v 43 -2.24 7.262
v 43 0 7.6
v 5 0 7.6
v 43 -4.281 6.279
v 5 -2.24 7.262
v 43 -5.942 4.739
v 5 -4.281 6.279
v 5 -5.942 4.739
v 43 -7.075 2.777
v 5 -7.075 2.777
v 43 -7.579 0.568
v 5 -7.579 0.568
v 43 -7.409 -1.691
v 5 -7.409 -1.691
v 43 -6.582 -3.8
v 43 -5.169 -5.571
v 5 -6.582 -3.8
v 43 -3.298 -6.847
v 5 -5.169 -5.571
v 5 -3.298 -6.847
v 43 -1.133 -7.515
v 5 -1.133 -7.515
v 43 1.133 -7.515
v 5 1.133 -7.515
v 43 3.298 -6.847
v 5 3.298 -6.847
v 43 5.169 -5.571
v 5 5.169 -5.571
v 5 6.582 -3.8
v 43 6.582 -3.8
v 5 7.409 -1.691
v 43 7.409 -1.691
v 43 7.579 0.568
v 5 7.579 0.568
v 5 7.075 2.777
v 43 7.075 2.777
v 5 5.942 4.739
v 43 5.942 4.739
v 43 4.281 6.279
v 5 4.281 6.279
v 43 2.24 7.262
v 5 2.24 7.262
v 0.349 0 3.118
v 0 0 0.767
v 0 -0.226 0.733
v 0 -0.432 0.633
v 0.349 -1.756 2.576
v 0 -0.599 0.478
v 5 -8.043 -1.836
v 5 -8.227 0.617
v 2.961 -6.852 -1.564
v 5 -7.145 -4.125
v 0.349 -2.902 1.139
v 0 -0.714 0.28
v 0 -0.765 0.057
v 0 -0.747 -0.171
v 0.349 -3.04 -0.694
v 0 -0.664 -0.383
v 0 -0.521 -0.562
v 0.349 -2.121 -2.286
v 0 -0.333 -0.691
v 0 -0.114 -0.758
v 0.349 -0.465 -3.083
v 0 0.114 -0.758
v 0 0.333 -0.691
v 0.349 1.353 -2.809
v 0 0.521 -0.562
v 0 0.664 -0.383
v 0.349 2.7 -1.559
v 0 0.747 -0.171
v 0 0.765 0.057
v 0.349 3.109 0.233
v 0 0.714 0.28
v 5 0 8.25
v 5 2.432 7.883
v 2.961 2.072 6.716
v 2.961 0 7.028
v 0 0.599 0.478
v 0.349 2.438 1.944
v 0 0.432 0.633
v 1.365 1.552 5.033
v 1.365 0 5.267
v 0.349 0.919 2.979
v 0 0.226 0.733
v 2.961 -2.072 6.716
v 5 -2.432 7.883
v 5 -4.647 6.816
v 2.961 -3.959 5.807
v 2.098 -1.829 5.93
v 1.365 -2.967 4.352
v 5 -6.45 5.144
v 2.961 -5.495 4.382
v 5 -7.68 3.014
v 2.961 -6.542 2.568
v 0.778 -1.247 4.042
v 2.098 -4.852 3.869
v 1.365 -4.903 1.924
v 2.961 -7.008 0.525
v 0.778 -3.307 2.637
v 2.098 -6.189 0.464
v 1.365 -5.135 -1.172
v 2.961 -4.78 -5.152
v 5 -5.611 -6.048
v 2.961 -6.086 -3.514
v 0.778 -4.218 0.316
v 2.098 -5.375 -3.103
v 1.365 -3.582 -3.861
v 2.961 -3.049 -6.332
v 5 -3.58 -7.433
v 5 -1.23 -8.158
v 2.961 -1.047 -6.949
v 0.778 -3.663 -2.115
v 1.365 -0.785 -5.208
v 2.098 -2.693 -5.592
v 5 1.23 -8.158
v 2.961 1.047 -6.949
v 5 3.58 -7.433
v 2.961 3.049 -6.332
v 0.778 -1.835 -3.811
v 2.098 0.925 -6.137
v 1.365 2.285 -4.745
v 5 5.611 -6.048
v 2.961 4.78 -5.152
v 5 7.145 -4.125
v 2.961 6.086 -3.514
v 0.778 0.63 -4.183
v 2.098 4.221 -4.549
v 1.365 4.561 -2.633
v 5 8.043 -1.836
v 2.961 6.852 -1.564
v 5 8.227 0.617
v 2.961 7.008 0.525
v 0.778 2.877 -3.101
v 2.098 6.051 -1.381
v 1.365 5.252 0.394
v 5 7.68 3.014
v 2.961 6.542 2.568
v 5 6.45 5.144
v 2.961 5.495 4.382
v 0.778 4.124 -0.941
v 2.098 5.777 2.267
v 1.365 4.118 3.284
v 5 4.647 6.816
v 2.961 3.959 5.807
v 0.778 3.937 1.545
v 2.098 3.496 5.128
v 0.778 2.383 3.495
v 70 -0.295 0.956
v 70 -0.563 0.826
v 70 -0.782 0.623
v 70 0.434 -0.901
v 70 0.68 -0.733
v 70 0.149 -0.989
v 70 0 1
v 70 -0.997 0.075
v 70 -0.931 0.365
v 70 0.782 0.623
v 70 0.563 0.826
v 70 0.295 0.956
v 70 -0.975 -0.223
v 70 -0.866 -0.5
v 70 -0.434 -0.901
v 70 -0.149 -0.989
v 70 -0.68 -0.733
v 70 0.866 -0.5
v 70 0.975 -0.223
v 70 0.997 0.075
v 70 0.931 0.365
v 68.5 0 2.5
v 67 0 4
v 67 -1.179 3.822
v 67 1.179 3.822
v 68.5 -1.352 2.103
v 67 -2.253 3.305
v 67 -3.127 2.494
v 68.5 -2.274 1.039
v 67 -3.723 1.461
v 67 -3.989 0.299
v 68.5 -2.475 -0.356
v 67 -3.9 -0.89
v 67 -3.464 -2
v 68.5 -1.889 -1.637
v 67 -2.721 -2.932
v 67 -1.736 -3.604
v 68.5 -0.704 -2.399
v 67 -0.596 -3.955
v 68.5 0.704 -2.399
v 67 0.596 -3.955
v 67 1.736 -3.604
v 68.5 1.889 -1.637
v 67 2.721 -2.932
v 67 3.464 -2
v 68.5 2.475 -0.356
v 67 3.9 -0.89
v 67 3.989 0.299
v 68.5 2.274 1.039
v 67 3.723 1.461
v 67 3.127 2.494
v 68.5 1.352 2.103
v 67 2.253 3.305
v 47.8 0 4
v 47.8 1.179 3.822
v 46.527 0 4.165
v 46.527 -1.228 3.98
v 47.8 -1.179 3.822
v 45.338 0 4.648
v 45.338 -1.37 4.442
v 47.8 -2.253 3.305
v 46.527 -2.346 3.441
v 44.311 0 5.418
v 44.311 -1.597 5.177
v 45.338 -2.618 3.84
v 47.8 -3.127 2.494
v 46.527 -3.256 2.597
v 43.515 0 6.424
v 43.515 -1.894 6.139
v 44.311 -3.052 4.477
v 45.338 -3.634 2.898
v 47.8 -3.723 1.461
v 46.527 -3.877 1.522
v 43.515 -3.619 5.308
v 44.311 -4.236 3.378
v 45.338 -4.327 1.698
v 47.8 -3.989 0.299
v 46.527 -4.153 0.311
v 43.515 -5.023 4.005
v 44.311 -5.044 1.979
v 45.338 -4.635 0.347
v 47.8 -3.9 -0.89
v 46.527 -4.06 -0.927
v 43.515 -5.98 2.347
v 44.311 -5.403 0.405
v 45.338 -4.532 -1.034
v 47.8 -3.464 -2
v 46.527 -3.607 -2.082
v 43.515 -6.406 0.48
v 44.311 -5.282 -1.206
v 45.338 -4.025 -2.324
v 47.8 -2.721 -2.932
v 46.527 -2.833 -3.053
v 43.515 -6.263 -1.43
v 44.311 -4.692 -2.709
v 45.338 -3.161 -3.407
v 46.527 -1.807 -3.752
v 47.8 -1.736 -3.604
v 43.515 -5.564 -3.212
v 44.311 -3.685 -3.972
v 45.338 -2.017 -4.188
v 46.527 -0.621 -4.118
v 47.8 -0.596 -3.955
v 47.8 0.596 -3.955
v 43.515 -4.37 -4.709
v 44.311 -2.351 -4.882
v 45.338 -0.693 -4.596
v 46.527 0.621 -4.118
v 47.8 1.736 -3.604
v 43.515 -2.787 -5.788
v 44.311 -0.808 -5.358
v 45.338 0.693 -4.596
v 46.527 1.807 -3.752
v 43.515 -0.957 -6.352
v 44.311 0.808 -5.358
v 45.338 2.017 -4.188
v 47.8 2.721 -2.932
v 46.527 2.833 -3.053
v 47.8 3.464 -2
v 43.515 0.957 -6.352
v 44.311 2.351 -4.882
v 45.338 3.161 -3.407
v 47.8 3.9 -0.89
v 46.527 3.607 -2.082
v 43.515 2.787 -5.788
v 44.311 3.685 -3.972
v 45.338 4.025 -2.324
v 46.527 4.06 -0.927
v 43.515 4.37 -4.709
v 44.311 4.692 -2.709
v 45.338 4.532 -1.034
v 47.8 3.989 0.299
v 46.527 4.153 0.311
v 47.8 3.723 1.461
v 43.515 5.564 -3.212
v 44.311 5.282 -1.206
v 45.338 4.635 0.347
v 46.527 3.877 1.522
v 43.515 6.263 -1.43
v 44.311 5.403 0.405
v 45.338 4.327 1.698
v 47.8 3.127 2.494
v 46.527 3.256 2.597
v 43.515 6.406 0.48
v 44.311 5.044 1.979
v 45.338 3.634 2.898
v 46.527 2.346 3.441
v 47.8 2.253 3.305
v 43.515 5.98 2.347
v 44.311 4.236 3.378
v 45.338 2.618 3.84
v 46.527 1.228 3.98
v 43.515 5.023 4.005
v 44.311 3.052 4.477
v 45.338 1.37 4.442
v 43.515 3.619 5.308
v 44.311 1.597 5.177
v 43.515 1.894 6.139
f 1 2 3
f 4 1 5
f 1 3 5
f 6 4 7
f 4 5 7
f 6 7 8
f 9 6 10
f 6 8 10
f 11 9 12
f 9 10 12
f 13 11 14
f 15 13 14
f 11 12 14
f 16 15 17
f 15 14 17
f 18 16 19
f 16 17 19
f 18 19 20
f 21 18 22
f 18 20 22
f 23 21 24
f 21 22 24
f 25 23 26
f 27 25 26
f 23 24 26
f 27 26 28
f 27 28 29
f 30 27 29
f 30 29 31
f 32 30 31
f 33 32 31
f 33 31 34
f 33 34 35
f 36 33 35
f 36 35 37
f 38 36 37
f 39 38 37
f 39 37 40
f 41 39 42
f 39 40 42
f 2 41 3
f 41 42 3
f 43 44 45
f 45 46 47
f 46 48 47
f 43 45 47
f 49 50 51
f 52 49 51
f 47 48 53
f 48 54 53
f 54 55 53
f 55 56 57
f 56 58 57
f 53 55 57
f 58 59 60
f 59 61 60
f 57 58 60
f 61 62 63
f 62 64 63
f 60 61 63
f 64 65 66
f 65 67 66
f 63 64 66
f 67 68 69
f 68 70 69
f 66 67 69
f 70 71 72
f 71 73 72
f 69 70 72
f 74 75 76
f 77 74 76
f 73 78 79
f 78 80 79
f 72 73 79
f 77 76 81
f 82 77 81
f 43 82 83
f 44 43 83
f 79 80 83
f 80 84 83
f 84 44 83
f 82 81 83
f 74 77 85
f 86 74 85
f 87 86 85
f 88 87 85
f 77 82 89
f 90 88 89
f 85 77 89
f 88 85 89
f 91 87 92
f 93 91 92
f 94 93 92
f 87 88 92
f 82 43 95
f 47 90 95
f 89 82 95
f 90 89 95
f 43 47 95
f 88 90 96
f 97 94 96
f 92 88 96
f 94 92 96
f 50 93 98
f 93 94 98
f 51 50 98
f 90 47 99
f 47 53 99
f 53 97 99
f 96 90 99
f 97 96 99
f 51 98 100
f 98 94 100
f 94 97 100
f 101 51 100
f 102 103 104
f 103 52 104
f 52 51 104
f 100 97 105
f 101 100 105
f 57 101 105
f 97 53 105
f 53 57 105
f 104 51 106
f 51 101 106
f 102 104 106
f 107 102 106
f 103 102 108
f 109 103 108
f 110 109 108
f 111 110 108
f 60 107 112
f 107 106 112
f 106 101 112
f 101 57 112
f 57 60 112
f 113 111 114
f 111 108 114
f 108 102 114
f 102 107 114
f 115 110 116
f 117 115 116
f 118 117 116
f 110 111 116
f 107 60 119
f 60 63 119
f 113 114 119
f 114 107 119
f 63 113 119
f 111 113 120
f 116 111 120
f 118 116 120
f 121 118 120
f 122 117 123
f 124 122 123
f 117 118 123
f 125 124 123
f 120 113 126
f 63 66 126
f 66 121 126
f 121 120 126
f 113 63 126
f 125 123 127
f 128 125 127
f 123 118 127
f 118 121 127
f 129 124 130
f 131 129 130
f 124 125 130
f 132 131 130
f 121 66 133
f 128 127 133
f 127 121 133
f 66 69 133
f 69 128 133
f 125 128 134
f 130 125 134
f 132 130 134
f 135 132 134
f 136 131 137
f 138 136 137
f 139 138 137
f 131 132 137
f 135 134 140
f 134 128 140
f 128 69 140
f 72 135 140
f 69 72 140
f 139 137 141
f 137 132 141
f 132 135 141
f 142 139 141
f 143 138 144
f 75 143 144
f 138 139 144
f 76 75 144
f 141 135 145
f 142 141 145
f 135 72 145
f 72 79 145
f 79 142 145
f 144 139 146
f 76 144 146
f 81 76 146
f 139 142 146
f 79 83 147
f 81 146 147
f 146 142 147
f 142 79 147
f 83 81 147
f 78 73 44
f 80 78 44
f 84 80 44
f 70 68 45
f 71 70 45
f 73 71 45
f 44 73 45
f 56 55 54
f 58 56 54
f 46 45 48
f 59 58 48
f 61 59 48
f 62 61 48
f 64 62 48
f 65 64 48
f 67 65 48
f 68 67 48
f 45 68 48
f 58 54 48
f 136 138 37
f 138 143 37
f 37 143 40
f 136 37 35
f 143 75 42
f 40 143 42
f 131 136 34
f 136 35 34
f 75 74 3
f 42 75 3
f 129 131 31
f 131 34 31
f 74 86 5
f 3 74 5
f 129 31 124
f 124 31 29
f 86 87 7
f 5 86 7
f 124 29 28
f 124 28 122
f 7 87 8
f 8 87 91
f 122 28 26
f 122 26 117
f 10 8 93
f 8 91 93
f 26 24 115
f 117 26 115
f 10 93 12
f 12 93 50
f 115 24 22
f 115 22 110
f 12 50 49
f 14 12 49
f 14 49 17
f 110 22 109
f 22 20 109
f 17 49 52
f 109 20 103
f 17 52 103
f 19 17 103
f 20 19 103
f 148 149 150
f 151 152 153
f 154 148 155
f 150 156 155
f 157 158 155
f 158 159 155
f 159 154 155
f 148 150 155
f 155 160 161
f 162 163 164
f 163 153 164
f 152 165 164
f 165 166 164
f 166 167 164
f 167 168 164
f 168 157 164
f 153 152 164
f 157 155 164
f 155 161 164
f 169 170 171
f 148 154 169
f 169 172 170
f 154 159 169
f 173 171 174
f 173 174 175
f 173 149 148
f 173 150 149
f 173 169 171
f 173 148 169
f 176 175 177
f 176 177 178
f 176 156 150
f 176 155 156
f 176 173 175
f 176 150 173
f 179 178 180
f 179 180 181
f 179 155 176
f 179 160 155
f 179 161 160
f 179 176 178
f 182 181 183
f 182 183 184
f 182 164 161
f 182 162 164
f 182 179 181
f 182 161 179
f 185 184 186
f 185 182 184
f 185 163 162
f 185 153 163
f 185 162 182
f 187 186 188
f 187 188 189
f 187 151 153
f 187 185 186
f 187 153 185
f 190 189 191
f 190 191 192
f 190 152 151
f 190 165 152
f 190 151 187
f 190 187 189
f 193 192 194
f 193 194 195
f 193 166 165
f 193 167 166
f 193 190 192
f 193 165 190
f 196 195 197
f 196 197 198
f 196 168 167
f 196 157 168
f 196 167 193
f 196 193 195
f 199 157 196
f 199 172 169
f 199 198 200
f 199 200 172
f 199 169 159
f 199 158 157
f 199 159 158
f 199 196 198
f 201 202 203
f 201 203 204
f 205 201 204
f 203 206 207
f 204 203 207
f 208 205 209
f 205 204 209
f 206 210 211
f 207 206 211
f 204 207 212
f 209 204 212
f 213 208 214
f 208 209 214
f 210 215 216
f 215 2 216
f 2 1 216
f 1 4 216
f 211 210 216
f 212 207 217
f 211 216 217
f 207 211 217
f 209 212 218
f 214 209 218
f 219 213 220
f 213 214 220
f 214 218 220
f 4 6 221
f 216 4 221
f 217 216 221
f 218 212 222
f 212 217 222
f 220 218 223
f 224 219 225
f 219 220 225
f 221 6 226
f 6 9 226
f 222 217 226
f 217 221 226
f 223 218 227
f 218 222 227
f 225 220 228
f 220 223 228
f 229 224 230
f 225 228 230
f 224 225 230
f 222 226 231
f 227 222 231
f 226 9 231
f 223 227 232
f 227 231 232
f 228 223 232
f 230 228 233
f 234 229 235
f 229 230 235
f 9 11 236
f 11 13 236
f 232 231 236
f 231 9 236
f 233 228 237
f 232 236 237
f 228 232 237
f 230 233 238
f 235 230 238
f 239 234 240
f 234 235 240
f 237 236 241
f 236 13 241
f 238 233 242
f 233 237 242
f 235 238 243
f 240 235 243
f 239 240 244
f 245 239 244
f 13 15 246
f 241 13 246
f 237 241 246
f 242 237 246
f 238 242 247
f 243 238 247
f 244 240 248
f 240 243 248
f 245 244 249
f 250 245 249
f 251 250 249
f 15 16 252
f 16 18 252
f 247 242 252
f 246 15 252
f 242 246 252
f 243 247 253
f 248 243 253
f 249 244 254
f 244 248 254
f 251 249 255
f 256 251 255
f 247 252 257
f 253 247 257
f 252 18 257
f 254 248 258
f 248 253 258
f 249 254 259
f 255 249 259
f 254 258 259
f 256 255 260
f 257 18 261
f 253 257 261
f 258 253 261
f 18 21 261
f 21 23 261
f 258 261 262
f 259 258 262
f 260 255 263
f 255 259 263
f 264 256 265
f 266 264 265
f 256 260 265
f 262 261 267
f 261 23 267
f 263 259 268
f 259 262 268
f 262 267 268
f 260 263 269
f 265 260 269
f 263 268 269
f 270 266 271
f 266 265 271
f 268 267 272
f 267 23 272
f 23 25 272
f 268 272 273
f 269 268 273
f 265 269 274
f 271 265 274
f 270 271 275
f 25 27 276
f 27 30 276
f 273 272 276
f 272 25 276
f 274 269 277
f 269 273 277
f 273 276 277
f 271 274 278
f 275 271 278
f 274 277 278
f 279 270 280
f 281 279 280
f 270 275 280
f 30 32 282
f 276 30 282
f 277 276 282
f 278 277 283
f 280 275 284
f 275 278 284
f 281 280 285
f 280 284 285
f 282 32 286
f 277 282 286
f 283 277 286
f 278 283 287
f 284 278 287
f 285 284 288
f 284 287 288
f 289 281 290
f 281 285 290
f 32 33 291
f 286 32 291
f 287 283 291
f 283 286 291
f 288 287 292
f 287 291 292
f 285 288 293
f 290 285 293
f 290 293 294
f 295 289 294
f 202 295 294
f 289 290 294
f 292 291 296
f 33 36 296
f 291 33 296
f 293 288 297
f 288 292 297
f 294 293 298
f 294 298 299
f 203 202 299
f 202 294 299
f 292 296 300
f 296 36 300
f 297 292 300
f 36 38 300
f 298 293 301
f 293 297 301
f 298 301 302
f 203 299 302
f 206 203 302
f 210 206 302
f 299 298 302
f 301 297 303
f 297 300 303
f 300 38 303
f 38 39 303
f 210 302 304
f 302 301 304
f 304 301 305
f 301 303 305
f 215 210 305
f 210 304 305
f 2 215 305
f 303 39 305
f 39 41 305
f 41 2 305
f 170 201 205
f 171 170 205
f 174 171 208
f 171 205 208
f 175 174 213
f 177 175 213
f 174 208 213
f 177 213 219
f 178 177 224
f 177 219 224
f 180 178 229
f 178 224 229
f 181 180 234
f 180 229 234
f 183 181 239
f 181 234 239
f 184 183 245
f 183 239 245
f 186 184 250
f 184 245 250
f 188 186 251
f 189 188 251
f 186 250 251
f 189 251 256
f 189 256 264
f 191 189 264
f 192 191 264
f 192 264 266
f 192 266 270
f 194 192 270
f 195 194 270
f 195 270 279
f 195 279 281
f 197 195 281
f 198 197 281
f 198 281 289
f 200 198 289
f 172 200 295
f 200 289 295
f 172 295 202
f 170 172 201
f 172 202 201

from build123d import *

# Parameters (mm, degrees)
F3_SIZE = 3


# Not quite as in the source:
# - a fillet or chamfer that OpenCascade refuses, or shapes differently, is made with other operations: its cross-section is extruded or revolved along the edge and cut away or added


with BuildPart() as f1:
    # F0 (on Front) → F1 (revolve)
    with BuildSketch(Plane.XZ):
        Polygon((0, 8.25), (0, 0), (70, 0), (70, 4), (43, 4), (43, 7.6), (5, 7.6), (5, 8.25), align=None)
    revolve(axis=Axis((35, 0, 0), (1, 0, 0)))

    # F2: fillet of radius 5 on 1 edges, made by hand

    # F2_s1 → F2_t2 (revolve)
    with BuildSketch(Plane.XZ):
        with BuildLine():
            ThreePointArc((47.8, 4), (44.8, 5), (43, 7.6))
            Line((43, 7.6), (43, 4))
            Line((43, 4), (47.8, 4))
        make_face()
    revolve(axis=Axis((43, 0, 0), (1, 0, 0)))

    # F3
    f3_edges = [f1.edges().sort_by_distance(p)[0] for p in [
        (70, 0, -4),
    ]]
    chamfer(f3_edges, length=F3_SIZE)

    # F4: fillet of radius 8.1 on 1 edges, made by hand

    # F4_s1 → F4_t2 (revolve, cut)
    with BuildSketch(Plane.XZ):
        with BuildLine():
            ThreePointArc((5, 8.25), (1.3650167038, 5.2666852265), (0, 0.7666852265))
            Line((0, 0.7666852265), (0, 8.25))
            Line((0, 8.25), (5, 8.25))
        make_face()
    revolve(axis=Axis((0, 0, 0), (1, 0, 0)), mode=Mode.SUBTRACT)


solid = f1.part
